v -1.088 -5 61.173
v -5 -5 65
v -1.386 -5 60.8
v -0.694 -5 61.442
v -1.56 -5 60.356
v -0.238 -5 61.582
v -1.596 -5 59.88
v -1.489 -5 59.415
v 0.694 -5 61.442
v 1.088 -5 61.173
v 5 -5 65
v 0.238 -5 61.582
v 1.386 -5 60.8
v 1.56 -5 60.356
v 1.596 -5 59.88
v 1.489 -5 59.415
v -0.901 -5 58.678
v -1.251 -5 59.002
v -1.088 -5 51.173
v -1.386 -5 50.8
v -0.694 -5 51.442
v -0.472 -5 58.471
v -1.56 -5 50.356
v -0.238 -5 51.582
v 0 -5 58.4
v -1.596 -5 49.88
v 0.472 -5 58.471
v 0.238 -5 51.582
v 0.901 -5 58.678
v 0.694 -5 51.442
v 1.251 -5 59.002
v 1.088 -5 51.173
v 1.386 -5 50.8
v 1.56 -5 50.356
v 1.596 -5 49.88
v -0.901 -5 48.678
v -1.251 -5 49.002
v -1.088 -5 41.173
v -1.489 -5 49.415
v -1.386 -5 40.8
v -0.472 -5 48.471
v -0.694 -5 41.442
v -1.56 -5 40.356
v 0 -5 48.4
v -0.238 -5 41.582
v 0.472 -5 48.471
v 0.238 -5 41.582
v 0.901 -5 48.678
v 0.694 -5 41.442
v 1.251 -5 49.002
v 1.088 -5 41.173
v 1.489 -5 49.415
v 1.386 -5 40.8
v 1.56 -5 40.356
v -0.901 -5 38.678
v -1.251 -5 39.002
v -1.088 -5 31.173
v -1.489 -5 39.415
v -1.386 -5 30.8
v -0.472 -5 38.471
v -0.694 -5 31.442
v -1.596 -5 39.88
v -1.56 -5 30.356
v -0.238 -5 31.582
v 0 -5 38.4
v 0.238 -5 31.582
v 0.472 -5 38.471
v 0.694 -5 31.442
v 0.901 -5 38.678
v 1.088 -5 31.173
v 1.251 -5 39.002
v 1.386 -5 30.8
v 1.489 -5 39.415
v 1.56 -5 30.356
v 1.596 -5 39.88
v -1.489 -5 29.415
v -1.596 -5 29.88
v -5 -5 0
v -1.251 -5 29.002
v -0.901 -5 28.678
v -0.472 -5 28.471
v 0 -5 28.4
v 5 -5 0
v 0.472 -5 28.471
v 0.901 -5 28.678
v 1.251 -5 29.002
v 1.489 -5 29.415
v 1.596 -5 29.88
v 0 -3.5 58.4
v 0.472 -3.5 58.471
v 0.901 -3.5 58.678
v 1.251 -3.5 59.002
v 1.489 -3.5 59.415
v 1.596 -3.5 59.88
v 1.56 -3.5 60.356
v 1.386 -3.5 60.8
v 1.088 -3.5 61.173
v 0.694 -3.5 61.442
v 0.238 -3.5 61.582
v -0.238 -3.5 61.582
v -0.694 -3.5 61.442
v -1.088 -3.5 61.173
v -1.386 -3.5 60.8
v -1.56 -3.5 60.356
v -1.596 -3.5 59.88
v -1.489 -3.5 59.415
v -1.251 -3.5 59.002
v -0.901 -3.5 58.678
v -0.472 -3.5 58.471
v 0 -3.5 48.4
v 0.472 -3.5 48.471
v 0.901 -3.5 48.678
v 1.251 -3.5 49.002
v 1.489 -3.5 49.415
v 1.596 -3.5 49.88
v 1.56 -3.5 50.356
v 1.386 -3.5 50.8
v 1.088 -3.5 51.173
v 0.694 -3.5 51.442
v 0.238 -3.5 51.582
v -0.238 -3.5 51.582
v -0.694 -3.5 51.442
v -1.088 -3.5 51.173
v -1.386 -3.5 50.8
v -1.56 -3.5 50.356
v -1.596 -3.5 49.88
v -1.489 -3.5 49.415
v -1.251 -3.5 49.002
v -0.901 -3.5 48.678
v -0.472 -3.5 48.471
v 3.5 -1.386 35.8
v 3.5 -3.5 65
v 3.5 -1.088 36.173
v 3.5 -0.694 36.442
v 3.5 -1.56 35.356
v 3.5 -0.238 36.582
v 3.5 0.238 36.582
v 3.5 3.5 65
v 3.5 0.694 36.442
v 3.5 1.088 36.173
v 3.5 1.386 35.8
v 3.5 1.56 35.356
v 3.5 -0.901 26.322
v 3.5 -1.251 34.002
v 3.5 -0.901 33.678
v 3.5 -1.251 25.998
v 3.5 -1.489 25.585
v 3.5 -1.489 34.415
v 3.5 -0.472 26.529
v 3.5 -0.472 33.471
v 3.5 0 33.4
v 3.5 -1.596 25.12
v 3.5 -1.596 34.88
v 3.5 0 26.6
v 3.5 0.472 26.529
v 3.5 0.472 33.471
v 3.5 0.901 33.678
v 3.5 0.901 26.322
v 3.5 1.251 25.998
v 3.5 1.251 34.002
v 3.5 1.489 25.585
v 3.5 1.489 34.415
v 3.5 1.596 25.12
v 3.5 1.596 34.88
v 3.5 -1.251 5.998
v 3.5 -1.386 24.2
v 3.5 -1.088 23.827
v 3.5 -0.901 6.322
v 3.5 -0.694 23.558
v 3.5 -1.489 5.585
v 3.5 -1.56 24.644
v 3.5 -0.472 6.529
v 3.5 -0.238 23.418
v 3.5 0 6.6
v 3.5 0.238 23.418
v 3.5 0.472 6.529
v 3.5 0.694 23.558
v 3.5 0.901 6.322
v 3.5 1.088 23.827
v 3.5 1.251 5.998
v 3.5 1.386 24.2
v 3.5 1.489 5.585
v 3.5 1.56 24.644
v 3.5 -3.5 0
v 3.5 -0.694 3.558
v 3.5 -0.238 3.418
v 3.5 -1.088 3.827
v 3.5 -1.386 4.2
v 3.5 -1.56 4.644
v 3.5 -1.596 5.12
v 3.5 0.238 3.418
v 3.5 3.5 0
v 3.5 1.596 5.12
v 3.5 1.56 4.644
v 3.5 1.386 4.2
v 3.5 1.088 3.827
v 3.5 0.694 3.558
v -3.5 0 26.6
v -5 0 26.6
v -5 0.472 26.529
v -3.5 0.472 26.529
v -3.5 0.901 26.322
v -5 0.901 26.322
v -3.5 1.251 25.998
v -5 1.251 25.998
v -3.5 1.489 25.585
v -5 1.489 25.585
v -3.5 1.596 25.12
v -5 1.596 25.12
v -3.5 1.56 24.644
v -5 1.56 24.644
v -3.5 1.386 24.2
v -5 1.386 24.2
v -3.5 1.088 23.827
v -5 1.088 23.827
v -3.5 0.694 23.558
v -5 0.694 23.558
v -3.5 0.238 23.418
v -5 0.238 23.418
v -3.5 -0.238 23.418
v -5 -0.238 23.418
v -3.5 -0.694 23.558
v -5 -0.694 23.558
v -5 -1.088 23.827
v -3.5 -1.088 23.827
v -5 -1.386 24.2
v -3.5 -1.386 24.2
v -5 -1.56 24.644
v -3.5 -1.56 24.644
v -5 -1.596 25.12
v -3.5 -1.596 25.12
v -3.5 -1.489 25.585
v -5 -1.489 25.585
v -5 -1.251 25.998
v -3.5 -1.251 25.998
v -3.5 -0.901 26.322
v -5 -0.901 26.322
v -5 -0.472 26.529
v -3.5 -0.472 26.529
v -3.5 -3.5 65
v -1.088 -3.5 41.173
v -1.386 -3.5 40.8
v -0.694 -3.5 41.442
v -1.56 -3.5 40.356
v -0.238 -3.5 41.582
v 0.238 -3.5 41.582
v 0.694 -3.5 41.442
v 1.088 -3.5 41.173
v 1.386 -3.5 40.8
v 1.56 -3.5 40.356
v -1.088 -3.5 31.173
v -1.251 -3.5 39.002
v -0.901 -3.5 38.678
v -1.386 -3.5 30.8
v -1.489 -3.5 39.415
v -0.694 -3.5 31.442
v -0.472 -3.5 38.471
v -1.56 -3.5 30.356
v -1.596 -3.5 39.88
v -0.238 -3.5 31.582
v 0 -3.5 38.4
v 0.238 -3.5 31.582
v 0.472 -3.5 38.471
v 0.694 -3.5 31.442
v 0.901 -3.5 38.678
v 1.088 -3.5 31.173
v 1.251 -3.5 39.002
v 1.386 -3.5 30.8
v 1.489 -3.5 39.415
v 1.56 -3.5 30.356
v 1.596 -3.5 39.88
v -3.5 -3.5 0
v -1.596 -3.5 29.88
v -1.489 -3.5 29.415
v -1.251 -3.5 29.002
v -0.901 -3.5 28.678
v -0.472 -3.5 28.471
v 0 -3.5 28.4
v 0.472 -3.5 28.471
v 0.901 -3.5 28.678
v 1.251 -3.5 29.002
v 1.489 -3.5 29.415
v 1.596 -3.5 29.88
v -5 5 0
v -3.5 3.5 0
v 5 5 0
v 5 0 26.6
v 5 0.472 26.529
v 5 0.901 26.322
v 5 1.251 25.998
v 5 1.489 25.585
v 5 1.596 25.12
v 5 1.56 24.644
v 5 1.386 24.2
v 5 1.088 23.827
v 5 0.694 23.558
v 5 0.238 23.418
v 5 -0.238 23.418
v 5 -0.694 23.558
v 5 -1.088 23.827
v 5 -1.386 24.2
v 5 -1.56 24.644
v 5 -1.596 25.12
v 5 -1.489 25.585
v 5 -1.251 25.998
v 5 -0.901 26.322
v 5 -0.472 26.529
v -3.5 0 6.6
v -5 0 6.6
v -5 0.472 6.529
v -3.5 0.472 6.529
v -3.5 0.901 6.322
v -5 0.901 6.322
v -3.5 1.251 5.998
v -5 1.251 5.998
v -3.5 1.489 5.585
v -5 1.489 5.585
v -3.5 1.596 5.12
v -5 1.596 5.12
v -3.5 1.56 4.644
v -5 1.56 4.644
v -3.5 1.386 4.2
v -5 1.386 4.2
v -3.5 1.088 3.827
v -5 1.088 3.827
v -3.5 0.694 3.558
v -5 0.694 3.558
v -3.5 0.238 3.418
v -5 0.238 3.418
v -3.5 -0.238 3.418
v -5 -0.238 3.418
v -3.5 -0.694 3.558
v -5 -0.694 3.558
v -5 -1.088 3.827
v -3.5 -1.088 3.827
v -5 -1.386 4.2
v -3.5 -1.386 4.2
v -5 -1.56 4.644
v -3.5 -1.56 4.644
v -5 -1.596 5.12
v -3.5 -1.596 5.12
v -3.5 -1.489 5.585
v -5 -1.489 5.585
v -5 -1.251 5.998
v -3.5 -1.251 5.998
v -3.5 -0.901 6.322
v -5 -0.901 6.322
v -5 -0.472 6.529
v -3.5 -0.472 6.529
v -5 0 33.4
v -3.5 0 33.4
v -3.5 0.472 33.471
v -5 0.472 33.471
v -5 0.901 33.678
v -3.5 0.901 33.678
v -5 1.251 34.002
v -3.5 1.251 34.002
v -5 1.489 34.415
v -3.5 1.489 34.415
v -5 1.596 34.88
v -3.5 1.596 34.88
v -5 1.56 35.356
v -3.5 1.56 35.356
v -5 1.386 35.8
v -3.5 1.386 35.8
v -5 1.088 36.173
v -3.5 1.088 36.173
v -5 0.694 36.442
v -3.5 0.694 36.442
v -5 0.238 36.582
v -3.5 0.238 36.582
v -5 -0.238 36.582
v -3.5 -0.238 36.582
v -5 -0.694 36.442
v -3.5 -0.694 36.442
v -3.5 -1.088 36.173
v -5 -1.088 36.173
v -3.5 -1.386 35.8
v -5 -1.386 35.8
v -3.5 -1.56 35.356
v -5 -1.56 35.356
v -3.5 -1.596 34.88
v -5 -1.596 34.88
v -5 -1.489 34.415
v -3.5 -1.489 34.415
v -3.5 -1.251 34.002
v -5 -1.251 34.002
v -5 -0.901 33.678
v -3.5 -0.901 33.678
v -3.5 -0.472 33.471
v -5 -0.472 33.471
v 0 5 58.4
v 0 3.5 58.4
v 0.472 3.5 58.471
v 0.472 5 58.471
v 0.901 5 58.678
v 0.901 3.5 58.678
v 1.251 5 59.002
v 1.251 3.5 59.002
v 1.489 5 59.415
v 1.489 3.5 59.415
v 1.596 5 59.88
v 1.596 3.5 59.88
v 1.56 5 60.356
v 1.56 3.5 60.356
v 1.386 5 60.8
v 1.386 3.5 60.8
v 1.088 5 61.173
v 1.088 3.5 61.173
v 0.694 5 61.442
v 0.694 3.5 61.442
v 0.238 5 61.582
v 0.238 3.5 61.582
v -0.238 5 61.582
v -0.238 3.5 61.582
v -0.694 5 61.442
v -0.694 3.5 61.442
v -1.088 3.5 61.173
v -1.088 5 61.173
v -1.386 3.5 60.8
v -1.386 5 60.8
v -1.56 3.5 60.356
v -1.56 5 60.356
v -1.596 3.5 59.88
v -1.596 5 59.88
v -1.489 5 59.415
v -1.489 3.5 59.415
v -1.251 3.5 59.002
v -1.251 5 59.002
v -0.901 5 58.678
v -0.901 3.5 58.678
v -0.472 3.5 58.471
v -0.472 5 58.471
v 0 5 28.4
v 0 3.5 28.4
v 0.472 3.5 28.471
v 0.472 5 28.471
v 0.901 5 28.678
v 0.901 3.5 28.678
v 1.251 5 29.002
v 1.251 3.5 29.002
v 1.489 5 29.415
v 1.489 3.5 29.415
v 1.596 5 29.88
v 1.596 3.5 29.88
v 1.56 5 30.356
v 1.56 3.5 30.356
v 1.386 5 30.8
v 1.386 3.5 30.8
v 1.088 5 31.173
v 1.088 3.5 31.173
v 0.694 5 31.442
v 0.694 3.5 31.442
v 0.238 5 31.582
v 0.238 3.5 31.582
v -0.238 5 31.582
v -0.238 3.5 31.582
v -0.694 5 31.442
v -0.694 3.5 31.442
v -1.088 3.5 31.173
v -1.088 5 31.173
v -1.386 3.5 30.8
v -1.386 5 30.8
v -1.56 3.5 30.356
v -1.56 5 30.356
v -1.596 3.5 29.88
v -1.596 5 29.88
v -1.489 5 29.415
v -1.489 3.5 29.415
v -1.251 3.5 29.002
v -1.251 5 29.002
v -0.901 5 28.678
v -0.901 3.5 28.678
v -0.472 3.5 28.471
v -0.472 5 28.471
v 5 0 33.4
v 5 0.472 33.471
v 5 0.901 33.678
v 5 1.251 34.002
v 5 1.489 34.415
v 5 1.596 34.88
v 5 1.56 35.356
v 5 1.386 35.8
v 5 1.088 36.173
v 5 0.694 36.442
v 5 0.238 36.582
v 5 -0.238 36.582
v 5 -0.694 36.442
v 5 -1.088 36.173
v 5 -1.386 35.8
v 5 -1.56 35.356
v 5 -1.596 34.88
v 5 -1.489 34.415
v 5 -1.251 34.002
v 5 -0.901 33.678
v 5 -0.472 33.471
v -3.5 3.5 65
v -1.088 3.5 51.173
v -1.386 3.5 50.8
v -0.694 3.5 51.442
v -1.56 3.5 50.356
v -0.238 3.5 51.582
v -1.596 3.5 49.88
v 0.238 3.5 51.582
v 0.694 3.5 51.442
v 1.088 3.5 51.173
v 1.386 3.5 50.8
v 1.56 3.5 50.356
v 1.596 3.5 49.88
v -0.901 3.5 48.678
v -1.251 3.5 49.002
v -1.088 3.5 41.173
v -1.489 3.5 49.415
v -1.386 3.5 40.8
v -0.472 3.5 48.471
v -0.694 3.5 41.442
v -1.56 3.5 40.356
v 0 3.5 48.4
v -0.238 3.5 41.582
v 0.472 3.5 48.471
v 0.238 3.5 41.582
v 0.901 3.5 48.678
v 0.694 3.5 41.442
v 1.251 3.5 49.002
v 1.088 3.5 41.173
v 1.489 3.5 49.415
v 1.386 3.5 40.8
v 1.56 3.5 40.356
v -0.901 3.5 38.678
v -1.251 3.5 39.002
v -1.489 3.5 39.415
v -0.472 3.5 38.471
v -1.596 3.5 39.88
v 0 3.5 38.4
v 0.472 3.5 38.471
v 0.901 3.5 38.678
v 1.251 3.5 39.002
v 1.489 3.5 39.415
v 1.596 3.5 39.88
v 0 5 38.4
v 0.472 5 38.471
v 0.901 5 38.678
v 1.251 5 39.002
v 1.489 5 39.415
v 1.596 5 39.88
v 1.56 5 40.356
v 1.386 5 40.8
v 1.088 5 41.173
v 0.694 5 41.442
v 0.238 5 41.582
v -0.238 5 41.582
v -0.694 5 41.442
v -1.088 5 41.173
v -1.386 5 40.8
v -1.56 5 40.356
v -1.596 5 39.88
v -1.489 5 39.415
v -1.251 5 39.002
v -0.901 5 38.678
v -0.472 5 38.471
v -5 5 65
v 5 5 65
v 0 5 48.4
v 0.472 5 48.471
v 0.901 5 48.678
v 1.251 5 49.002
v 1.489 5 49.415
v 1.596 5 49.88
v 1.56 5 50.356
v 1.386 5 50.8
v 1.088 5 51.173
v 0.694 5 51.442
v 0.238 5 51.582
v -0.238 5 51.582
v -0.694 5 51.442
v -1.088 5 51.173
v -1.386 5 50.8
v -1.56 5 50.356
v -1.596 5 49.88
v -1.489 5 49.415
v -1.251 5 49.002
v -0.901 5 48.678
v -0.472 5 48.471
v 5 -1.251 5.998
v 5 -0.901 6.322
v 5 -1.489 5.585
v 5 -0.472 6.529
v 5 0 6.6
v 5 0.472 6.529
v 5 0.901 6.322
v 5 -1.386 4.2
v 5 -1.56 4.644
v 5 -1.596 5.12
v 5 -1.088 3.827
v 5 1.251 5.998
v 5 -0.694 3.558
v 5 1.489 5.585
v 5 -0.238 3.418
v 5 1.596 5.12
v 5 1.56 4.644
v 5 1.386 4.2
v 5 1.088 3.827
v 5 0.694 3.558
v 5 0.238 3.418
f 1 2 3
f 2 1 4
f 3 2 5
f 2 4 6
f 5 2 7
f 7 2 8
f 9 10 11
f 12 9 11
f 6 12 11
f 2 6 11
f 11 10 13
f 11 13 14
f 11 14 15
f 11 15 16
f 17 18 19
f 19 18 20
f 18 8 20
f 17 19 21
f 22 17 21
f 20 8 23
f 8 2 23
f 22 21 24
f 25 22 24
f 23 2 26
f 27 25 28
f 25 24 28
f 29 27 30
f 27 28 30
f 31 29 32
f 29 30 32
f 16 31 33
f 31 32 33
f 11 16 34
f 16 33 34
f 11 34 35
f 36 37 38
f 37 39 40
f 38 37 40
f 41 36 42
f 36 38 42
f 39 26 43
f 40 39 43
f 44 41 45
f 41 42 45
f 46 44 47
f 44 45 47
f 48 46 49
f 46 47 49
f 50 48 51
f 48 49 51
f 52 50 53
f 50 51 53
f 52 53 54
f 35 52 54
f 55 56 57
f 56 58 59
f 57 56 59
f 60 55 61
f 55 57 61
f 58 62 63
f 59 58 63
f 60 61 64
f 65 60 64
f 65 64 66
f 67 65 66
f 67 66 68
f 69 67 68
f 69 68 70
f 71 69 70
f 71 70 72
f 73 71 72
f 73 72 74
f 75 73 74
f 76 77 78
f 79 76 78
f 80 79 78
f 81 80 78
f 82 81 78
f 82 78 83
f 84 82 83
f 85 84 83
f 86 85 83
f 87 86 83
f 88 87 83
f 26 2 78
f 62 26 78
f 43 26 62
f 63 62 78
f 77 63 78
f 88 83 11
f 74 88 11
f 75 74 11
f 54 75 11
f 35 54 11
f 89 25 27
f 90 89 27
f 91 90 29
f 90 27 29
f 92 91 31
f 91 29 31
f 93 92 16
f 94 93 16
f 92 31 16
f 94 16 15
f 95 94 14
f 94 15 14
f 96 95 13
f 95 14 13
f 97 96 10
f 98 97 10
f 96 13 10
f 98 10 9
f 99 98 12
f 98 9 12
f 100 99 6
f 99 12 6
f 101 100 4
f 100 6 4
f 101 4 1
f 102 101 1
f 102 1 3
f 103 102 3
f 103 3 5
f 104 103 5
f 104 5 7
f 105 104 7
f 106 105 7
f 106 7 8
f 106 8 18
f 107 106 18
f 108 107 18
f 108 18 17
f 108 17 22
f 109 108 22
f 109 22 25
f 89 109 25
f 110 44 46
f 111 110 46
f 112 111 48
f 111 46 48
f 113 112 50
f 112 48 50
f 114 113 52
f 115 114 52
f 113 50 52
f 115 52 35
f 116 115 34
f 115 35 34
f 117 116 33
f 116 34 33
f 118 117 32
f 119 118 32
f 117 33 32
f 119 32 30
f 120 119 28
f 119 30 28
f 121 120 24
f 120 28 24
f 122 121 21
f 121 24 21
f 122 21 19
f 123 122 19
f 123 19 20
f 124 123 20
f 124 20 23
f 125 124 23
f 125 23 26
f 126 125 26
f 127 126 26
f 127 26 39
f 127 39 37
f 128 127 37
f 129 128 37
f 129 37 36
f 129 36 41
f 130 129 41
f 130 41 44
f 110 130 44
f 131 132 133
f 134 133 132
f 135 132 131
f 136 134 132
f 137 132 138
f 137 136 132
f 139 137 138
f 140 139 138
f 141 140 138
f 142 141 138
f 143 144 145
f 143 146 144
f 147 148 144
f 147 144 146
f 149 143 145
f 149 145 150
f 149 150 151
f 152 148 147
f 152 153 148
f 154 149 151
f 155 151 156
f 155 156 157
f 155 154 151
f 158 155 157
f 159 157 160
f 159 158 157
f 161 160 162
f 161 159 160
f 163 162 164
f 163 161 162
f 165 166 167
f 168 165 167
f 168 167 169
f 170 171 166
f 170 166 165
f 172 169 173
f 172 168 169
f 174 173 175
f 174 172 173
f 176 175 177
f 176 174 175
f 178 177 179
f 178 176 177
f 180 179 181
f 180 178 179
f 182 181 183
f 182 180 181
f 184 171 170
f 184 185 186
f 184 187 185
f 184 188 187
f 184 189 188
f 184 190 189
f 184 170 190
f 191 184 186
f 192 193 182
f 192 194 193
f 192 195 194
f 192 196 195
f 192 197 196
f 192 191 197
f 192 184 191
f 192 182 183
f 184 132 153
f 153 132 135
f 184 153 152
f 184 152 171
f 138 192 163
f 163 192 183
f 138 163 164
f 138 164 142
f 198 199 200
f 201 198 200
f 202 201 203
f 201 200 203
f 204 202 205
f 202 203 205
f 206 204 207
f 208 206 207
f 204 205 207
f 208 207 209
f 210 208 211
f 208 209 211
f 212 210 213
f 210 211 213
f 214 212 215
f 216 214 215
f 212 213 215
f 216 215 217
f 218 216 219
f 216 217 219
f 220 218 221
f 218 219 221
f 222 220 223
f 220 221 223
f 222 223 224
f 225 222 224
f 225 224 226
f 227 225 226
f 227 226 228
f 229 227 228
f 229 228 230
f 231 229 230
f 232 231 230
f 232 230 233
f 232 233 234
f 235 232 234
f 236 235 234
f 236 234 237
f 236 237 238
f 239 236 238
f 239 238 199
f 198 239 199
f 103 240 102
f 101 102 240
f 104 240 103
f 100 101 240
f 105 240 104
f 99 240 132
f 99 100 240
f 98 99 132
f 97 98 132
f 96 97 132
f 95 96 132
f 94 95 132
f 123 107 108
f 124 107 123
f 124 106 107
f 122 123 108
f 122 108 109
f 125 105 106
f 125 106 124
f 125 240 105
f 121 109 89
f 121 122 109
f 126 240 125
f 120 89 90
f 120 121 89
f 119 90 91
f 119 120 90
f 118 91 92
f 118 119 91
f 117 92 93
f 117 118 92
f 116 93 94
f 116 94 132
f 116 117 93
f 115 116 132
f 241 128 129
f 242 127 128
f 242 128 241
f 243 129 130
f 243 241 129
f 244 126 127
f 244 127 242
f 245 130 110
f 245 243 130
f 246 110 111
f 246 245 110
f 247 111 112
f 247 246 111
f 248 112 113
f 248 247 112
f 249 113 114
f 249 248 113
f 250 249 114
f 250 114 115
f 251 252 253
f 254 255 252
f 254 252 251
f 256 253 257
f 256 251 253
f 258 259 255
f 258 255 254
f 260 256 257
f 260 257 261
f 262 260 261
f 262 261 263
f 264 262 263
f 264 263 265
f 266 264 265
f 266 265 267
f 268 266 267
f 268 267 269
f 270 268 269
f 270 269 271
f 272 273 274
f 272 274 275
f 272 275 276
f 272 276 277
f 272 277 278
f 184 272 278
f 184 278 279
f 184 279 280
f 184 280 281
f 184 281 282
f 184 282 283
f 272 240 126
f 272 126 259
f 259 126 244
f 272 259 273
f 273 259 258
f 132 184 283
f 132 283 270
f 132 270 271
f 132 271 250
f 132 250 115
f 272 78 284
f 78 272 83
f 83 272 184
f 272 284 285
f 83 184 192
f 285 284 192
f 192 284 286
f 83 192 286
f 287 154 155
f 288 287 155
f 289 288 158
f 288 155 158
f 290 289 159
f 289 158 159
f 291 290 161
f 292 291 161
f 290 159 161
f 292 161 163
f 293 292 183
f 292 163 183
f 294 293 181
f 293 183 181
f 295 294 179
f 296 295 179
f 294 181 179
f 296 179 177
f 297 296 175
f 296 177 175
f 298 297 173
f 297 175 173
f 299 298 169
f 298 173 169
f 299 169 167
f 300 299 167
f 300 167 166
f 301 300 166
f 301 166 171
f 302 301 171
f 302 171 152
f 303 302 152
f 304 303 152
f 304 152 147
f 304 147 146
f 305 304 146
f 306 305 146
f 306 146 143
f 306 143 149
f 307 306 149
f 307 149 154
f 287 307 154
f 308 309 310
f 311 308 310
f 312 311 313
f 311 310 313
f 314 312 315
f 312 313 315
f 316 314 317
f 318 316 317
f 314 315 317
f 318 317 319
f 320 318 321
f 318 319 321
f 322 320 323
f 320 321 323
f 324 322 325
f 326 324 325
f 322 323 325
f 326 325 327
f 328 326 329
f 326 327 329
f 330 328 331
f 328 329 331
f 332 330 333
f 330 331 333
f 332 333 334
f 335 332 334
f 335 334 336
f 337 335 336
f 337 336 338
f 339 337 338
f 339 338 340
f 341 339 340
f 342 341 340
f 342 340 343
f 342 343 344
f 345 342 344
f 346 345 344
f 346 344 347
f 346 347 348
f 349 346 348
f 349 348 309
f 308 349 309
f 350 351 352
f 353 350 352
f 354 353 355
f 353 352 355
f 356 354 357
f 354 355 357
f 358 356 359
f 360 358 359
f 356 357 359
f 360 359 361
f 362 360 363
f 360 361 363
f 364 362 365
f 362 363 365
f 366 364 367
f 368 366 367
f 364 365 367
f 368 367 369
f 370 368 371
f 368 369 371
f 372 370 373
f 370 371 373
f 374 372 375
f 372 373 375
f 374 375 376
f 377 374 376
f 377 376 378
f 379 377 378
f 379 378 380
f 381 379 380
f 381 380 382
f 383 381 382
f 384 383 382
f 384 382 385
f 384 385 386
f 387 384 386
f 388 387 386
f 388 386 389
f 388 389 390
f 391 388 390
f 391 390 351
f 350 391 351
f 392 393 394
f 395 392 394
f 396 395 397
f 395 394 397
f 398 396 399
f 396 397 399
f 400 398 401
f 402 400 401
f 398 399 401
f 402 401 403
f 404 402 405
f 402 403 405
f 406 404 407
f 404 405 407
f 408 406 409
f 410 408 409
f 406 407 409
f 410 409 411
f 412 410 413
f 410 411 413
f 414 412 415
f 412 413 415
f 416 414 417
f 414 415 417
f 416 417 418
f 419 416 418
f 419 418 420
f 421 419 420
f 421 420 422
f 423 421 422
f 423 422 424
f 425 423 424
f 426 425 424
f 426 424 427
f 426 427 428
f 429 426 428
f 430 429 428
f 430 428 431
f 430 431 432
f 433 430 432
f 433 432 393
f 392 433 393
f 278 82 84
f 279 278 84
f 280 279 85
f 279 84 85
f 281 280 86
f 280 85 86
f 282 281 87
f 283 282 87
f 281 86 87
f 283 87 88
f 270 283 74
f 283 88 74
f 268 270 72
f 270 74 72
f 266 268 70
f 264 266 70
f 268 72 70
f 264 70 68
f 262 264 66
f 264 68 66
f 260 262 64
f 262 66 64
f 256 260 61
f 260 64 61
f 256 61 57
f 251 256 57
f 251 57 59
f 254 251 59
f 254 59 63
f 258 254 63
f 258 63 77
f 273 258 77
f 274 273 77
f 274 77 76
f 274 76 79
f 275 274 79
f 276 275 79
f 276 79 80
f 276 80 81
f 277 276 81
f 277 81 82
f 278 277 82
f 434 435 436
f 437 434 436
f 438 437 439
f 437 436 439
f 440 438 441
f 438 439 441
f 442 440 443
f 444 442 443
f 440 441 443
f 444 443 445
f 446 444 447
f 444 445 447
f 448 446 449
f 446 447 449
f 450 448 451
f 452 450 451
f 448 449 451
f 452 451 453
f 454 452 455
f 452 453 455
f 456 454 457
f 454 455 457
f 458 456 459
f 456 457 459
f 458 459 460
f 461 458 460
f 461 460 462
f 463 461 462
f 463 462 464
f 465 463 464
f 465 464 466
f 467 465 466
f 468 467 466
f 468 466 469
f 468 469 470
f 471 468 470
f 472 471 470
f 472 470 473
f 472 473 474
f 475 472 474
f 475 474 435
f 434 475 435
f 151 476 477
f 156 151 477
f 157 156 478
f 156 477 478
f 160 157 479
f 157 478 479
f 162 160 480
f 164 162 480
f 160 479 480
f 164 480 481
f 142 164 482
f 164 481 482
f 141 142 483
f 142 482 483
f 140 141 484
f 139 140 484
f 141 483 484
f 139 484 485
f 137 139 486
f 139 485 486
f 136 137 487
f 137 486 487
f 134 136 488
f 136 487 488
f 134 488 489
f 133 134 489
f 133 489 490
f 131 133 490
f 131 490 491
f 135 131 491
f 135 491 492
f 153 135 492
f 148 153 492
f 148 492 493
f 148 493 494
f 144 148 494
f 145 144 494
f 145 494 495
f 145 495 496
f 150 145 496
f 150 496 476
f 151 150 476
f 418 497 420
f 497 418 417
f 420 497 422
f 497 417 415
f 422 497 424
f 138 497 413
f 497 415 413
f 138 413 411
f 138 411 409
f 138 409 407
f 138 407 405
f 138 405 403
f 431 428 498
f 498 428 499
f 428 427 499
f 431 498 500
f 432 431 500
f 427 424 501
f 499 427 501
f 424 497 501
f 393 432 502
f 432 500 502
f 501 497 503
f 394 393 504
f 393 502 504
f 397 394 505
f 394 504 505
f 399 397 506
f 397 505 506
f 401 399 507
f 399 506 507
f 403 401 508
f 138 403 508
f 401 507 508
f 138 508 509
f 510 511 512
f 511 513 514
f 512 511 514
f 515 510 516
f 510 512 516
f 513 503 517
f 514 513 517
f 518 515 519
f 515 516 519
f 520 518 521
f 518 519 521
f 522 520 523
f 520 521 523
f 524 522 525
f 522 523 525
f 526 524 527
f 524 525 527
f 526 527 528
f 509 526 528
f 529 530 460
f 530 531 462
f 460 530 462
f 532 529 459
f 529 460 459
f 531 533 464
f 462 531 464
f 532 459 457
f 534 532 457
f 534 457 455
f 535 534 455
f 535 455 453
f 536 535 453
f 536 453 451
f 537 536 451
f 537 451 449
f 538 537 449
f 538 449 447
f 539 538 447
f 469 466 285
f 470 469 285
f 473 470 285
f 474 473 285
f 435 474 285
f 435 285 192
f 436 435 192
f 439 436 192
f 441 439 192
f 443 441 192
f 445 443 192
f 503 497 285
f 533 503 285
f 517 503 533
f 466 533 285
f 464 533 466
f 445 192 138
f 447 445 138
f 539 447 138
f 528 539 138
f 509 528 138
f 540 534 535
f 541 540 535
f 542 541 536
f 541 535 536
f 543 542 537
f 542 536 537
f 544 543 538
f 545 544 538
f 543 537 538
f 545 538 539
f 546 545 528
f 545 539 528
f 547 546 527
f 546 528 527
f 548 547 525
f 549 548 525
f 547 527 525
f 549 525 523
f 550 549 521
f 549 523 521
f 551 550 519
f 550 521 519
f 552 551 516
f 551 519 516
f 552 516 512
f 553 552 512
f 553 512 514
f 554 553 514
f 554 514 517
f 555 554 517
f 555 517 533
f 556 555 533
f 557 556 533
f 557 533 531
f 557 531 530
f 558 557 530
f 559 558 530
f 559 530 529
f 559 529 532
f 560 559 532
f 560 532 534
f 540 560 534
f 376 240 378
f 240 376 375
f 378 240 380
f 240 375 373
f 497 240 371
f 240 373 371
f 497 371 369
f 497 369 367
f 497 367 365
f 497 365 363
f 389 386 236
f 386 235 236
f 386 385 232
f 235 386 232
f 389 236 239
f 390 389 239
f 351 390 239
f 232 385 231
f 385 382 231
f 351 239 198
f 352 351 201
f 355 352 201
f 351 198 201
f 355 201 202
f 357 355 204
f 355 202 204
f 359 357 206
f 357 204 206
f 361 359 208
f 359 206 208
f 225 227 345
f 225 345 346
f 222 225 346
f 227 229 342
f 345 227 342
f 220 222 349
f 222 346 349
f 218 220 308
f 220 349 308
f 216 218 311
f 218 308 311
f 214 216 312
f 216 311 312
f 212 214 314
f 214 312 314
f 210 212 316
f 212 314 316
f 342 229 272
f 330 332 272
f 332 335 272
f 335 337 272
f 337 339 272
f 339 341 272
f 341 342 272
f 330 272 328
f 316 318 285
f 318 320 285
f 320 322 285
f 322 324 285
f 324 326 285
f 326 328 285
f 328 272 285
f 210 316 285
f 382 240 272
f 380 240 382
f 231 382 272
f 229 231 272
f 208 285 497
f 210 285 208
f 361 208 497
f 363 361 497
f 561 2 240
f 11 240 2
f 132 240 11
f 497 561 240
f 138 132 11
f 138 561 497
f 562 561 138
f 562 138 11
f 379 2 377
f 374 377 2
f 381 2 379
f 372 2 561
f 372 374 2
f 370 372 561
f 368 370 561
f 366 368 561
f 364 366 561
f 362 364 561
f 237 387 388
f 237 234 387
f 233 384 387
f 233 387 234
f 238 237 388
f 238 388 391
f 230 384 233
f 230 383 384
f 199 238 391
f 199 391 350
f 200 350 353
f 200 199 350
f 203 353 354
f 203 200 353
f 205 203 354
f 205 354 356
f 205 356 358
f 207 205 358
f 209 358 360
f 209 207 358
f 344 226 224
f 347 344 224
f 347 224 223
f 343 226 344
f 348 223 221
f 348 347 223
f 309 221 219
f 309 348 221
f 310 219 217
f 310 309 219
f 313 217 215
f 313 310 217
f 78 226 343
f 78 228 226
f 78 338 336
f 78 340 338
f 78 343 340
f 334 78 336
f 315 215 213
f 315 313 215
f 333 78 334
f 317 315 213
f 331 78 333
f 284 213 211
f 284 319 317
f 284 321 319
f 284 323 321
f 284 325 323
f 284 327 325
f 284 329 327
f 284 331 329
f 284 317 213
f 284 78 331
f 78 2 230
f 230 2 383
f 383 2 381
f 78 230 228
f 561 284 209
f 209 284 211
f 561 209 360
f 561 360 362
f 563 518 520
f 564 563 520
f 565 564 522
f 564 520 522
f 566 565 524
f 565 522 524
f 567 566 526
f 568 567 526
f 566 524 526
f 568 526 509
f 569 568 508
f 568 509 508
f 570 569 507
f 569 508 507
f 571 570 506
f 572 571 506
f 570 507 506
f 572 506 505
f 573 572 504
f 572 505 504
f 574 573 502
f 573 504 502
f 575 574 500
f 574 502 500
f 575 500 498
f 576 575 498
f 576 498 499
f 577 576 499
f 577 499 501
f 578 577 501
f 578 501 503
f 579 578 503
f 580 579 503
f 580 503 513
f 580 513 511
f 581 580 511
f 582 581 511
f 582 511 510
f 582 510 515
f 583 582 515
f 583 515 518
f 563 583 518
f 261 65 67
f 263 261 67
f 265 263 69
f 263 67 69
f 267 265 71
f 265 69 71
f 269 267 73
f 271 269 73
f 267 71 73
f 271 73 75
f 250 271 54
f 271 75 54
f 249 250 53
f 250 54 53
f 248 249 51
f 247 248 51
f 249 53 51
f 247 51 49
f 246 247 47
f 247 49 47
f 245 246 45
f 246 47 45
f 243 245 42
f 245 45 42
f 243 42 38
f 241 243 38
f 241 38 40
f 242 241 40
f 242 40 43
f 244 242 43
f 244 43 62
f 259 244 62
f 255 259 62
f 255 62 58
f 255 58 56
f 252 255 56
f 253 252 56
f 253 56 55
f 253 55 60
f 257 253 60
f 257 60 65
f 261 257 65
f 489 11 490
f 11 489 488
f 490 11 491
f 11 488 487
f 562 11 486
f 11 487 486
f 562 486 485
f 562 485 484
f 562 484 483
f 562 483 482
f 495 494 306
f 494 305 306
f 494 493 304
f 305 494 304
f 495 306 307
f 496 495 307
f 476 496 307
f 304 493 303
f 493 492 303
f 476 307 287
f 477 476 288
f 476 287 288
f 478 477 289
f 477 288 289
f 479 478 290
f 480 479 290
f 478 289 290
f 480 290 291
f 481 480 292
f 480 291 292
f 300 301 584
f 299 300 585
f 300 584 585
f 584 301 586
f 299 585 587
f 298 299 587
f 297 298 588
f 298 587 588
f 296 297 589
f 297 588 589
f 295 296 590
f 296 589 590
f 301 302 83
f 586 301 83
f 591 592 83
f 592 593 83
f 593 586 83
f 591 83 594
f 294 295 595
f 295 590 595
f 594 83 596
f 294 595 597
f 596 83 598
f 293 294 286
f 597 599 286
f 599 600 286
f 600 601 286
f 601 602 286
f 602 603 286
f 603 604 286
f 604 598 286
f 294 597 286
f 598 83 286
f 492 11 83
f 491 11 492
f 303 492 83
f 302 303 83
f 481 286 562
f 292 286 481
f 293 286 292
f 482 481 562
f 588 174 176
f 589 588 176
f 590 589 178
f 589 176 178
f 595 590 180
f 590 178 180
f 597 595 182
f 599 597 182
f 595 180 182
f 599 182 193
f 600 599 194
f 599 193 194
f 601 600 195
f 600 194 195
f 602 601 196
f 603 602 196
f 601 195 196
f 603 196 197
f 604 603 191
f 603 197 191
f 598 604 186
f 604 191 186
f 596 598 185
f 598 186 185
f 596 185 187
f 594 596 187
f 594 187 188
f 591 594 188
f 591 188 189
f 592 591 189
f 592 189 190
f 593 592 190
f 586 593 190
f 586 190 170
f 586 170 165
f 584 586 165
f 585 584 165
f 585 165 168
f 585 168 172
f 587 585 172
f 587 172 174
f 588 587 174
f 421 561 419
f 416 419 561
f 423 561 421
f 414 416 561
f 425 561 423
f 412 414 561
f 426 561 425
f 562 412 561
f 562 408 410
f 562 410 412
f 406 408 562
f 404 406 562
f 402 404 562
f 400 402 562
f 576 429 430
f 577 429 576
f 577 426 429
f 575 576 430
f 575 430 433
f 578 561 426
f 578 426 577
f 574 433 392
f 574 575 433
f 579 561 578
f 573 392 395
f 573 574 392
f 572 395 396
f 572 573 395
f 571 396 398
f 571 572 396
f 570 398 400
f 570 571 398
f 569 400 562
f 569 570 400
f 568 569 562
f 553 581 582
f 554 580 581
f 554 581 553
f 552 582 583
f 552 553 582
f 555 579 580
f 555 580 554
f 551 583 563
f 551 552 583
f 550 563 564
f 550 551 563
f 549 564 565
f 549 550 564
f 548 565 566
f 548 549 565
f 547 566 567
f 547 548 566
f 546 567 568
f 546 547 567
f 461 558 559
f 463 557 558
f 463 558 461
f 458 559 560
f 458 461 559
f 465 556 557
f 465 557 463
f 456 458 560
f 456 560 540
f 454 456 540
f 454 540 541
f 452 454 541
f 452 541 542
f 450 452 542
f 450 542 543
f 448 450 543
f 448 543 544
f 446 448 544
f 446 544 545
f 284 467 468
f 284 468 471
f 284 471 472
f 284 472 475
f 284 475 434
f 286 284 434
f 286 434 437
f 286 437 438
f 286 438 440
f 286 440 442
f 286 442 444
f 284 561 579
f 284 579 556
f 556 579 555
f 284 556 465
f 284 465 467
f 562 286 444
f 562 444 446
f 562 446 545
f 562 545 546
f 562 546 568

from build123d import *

# Parameters (mm, degrees)
SKETCH_1_W          = 10
SKETCH_1_H          = 10
SKETCH_1_W_2        = 7
SKETCH_1_H_2        = 7
EXTRUDE_1_DEPTH     = 65
SKETCH_3_R          = 1.6
CUT_EXTRUDE_1_DEPTH = 66.954529791
SKETCH_4_R          = 1.6
CUT_EXTRUDE_2_DEPTH = 66.954529791
SKETCH_5_R          = 1.6
CUT_EXTRUDE_3_DEPTH = 66.954529791


with BuildPart() as part:
    # ｽｹｯﾁ1 → 押し出し-薄板1 (new body)
    with BuildSketch(Plane.XY):
        Rectangle(SKETCH_1_W, SKETCH_1_H)
        Rectangle(SKETCH_1_W_2, SKETCH_1_H_2, mode=Mode.SUBTRACT)
    extrude(amount=EXTRUDE_1_DEPTH)

    # ｽｹｯﾁ3 → ｶｯﾄ - 押し出し1 (cut, through all)
    with BuildSketch(Plane.ZY.offset(5)):
        with Locations((5, 0)):
            Circle(SKETCH_3_R)
        with Locations((25, 0)):
            Circle(SKETCH_3_R)
    extrude(amount=-CUT_EXTRUDE_1_DEPTH, mode=Mode.SUBTRACT)

    # ｽｹｯﾁ4 → ｶｯﾄ - 押し出し2 (cut, through all)
    with BuildSketch(Plane.XZ.offset(5)):
        with Locations(Location((0, 30, 0), (0, 0, 270))):
            Circle(SKETCH_4_R)
        with Locations(Location((0, 40, 0), (0, 0, 270))):
            Circle(SKETCH_4_R)
        with Locations(Location((0, 50, 0), (0, 0, 270))):
            Circle(SKETCH_4_R)
        with Locations(Location((0, 60, 0), (0, 0, 270))):
            Circle(SKETCH_4_R)
    extrude(amount=-CUT_EXTRUDE_2_DEPTH, mode=Mode.SUBTRACT)

    # ｽｹｯﾁ5 → ｶｯﾄ - 押し出し3 (cut, through all)
    with BuildSketch(Plane(origin=(5, 0, 0), x_dir=(0, 0, -1), z_dir=(1, 0, 0))):
        with Locations((-35, 0)):
            Circle(SKETCH_5_R)
    extrude(amount=-CUT_EXTRUDE_3_DEPTH, mode=Mode.SUBTRACT)


solid = part.part
